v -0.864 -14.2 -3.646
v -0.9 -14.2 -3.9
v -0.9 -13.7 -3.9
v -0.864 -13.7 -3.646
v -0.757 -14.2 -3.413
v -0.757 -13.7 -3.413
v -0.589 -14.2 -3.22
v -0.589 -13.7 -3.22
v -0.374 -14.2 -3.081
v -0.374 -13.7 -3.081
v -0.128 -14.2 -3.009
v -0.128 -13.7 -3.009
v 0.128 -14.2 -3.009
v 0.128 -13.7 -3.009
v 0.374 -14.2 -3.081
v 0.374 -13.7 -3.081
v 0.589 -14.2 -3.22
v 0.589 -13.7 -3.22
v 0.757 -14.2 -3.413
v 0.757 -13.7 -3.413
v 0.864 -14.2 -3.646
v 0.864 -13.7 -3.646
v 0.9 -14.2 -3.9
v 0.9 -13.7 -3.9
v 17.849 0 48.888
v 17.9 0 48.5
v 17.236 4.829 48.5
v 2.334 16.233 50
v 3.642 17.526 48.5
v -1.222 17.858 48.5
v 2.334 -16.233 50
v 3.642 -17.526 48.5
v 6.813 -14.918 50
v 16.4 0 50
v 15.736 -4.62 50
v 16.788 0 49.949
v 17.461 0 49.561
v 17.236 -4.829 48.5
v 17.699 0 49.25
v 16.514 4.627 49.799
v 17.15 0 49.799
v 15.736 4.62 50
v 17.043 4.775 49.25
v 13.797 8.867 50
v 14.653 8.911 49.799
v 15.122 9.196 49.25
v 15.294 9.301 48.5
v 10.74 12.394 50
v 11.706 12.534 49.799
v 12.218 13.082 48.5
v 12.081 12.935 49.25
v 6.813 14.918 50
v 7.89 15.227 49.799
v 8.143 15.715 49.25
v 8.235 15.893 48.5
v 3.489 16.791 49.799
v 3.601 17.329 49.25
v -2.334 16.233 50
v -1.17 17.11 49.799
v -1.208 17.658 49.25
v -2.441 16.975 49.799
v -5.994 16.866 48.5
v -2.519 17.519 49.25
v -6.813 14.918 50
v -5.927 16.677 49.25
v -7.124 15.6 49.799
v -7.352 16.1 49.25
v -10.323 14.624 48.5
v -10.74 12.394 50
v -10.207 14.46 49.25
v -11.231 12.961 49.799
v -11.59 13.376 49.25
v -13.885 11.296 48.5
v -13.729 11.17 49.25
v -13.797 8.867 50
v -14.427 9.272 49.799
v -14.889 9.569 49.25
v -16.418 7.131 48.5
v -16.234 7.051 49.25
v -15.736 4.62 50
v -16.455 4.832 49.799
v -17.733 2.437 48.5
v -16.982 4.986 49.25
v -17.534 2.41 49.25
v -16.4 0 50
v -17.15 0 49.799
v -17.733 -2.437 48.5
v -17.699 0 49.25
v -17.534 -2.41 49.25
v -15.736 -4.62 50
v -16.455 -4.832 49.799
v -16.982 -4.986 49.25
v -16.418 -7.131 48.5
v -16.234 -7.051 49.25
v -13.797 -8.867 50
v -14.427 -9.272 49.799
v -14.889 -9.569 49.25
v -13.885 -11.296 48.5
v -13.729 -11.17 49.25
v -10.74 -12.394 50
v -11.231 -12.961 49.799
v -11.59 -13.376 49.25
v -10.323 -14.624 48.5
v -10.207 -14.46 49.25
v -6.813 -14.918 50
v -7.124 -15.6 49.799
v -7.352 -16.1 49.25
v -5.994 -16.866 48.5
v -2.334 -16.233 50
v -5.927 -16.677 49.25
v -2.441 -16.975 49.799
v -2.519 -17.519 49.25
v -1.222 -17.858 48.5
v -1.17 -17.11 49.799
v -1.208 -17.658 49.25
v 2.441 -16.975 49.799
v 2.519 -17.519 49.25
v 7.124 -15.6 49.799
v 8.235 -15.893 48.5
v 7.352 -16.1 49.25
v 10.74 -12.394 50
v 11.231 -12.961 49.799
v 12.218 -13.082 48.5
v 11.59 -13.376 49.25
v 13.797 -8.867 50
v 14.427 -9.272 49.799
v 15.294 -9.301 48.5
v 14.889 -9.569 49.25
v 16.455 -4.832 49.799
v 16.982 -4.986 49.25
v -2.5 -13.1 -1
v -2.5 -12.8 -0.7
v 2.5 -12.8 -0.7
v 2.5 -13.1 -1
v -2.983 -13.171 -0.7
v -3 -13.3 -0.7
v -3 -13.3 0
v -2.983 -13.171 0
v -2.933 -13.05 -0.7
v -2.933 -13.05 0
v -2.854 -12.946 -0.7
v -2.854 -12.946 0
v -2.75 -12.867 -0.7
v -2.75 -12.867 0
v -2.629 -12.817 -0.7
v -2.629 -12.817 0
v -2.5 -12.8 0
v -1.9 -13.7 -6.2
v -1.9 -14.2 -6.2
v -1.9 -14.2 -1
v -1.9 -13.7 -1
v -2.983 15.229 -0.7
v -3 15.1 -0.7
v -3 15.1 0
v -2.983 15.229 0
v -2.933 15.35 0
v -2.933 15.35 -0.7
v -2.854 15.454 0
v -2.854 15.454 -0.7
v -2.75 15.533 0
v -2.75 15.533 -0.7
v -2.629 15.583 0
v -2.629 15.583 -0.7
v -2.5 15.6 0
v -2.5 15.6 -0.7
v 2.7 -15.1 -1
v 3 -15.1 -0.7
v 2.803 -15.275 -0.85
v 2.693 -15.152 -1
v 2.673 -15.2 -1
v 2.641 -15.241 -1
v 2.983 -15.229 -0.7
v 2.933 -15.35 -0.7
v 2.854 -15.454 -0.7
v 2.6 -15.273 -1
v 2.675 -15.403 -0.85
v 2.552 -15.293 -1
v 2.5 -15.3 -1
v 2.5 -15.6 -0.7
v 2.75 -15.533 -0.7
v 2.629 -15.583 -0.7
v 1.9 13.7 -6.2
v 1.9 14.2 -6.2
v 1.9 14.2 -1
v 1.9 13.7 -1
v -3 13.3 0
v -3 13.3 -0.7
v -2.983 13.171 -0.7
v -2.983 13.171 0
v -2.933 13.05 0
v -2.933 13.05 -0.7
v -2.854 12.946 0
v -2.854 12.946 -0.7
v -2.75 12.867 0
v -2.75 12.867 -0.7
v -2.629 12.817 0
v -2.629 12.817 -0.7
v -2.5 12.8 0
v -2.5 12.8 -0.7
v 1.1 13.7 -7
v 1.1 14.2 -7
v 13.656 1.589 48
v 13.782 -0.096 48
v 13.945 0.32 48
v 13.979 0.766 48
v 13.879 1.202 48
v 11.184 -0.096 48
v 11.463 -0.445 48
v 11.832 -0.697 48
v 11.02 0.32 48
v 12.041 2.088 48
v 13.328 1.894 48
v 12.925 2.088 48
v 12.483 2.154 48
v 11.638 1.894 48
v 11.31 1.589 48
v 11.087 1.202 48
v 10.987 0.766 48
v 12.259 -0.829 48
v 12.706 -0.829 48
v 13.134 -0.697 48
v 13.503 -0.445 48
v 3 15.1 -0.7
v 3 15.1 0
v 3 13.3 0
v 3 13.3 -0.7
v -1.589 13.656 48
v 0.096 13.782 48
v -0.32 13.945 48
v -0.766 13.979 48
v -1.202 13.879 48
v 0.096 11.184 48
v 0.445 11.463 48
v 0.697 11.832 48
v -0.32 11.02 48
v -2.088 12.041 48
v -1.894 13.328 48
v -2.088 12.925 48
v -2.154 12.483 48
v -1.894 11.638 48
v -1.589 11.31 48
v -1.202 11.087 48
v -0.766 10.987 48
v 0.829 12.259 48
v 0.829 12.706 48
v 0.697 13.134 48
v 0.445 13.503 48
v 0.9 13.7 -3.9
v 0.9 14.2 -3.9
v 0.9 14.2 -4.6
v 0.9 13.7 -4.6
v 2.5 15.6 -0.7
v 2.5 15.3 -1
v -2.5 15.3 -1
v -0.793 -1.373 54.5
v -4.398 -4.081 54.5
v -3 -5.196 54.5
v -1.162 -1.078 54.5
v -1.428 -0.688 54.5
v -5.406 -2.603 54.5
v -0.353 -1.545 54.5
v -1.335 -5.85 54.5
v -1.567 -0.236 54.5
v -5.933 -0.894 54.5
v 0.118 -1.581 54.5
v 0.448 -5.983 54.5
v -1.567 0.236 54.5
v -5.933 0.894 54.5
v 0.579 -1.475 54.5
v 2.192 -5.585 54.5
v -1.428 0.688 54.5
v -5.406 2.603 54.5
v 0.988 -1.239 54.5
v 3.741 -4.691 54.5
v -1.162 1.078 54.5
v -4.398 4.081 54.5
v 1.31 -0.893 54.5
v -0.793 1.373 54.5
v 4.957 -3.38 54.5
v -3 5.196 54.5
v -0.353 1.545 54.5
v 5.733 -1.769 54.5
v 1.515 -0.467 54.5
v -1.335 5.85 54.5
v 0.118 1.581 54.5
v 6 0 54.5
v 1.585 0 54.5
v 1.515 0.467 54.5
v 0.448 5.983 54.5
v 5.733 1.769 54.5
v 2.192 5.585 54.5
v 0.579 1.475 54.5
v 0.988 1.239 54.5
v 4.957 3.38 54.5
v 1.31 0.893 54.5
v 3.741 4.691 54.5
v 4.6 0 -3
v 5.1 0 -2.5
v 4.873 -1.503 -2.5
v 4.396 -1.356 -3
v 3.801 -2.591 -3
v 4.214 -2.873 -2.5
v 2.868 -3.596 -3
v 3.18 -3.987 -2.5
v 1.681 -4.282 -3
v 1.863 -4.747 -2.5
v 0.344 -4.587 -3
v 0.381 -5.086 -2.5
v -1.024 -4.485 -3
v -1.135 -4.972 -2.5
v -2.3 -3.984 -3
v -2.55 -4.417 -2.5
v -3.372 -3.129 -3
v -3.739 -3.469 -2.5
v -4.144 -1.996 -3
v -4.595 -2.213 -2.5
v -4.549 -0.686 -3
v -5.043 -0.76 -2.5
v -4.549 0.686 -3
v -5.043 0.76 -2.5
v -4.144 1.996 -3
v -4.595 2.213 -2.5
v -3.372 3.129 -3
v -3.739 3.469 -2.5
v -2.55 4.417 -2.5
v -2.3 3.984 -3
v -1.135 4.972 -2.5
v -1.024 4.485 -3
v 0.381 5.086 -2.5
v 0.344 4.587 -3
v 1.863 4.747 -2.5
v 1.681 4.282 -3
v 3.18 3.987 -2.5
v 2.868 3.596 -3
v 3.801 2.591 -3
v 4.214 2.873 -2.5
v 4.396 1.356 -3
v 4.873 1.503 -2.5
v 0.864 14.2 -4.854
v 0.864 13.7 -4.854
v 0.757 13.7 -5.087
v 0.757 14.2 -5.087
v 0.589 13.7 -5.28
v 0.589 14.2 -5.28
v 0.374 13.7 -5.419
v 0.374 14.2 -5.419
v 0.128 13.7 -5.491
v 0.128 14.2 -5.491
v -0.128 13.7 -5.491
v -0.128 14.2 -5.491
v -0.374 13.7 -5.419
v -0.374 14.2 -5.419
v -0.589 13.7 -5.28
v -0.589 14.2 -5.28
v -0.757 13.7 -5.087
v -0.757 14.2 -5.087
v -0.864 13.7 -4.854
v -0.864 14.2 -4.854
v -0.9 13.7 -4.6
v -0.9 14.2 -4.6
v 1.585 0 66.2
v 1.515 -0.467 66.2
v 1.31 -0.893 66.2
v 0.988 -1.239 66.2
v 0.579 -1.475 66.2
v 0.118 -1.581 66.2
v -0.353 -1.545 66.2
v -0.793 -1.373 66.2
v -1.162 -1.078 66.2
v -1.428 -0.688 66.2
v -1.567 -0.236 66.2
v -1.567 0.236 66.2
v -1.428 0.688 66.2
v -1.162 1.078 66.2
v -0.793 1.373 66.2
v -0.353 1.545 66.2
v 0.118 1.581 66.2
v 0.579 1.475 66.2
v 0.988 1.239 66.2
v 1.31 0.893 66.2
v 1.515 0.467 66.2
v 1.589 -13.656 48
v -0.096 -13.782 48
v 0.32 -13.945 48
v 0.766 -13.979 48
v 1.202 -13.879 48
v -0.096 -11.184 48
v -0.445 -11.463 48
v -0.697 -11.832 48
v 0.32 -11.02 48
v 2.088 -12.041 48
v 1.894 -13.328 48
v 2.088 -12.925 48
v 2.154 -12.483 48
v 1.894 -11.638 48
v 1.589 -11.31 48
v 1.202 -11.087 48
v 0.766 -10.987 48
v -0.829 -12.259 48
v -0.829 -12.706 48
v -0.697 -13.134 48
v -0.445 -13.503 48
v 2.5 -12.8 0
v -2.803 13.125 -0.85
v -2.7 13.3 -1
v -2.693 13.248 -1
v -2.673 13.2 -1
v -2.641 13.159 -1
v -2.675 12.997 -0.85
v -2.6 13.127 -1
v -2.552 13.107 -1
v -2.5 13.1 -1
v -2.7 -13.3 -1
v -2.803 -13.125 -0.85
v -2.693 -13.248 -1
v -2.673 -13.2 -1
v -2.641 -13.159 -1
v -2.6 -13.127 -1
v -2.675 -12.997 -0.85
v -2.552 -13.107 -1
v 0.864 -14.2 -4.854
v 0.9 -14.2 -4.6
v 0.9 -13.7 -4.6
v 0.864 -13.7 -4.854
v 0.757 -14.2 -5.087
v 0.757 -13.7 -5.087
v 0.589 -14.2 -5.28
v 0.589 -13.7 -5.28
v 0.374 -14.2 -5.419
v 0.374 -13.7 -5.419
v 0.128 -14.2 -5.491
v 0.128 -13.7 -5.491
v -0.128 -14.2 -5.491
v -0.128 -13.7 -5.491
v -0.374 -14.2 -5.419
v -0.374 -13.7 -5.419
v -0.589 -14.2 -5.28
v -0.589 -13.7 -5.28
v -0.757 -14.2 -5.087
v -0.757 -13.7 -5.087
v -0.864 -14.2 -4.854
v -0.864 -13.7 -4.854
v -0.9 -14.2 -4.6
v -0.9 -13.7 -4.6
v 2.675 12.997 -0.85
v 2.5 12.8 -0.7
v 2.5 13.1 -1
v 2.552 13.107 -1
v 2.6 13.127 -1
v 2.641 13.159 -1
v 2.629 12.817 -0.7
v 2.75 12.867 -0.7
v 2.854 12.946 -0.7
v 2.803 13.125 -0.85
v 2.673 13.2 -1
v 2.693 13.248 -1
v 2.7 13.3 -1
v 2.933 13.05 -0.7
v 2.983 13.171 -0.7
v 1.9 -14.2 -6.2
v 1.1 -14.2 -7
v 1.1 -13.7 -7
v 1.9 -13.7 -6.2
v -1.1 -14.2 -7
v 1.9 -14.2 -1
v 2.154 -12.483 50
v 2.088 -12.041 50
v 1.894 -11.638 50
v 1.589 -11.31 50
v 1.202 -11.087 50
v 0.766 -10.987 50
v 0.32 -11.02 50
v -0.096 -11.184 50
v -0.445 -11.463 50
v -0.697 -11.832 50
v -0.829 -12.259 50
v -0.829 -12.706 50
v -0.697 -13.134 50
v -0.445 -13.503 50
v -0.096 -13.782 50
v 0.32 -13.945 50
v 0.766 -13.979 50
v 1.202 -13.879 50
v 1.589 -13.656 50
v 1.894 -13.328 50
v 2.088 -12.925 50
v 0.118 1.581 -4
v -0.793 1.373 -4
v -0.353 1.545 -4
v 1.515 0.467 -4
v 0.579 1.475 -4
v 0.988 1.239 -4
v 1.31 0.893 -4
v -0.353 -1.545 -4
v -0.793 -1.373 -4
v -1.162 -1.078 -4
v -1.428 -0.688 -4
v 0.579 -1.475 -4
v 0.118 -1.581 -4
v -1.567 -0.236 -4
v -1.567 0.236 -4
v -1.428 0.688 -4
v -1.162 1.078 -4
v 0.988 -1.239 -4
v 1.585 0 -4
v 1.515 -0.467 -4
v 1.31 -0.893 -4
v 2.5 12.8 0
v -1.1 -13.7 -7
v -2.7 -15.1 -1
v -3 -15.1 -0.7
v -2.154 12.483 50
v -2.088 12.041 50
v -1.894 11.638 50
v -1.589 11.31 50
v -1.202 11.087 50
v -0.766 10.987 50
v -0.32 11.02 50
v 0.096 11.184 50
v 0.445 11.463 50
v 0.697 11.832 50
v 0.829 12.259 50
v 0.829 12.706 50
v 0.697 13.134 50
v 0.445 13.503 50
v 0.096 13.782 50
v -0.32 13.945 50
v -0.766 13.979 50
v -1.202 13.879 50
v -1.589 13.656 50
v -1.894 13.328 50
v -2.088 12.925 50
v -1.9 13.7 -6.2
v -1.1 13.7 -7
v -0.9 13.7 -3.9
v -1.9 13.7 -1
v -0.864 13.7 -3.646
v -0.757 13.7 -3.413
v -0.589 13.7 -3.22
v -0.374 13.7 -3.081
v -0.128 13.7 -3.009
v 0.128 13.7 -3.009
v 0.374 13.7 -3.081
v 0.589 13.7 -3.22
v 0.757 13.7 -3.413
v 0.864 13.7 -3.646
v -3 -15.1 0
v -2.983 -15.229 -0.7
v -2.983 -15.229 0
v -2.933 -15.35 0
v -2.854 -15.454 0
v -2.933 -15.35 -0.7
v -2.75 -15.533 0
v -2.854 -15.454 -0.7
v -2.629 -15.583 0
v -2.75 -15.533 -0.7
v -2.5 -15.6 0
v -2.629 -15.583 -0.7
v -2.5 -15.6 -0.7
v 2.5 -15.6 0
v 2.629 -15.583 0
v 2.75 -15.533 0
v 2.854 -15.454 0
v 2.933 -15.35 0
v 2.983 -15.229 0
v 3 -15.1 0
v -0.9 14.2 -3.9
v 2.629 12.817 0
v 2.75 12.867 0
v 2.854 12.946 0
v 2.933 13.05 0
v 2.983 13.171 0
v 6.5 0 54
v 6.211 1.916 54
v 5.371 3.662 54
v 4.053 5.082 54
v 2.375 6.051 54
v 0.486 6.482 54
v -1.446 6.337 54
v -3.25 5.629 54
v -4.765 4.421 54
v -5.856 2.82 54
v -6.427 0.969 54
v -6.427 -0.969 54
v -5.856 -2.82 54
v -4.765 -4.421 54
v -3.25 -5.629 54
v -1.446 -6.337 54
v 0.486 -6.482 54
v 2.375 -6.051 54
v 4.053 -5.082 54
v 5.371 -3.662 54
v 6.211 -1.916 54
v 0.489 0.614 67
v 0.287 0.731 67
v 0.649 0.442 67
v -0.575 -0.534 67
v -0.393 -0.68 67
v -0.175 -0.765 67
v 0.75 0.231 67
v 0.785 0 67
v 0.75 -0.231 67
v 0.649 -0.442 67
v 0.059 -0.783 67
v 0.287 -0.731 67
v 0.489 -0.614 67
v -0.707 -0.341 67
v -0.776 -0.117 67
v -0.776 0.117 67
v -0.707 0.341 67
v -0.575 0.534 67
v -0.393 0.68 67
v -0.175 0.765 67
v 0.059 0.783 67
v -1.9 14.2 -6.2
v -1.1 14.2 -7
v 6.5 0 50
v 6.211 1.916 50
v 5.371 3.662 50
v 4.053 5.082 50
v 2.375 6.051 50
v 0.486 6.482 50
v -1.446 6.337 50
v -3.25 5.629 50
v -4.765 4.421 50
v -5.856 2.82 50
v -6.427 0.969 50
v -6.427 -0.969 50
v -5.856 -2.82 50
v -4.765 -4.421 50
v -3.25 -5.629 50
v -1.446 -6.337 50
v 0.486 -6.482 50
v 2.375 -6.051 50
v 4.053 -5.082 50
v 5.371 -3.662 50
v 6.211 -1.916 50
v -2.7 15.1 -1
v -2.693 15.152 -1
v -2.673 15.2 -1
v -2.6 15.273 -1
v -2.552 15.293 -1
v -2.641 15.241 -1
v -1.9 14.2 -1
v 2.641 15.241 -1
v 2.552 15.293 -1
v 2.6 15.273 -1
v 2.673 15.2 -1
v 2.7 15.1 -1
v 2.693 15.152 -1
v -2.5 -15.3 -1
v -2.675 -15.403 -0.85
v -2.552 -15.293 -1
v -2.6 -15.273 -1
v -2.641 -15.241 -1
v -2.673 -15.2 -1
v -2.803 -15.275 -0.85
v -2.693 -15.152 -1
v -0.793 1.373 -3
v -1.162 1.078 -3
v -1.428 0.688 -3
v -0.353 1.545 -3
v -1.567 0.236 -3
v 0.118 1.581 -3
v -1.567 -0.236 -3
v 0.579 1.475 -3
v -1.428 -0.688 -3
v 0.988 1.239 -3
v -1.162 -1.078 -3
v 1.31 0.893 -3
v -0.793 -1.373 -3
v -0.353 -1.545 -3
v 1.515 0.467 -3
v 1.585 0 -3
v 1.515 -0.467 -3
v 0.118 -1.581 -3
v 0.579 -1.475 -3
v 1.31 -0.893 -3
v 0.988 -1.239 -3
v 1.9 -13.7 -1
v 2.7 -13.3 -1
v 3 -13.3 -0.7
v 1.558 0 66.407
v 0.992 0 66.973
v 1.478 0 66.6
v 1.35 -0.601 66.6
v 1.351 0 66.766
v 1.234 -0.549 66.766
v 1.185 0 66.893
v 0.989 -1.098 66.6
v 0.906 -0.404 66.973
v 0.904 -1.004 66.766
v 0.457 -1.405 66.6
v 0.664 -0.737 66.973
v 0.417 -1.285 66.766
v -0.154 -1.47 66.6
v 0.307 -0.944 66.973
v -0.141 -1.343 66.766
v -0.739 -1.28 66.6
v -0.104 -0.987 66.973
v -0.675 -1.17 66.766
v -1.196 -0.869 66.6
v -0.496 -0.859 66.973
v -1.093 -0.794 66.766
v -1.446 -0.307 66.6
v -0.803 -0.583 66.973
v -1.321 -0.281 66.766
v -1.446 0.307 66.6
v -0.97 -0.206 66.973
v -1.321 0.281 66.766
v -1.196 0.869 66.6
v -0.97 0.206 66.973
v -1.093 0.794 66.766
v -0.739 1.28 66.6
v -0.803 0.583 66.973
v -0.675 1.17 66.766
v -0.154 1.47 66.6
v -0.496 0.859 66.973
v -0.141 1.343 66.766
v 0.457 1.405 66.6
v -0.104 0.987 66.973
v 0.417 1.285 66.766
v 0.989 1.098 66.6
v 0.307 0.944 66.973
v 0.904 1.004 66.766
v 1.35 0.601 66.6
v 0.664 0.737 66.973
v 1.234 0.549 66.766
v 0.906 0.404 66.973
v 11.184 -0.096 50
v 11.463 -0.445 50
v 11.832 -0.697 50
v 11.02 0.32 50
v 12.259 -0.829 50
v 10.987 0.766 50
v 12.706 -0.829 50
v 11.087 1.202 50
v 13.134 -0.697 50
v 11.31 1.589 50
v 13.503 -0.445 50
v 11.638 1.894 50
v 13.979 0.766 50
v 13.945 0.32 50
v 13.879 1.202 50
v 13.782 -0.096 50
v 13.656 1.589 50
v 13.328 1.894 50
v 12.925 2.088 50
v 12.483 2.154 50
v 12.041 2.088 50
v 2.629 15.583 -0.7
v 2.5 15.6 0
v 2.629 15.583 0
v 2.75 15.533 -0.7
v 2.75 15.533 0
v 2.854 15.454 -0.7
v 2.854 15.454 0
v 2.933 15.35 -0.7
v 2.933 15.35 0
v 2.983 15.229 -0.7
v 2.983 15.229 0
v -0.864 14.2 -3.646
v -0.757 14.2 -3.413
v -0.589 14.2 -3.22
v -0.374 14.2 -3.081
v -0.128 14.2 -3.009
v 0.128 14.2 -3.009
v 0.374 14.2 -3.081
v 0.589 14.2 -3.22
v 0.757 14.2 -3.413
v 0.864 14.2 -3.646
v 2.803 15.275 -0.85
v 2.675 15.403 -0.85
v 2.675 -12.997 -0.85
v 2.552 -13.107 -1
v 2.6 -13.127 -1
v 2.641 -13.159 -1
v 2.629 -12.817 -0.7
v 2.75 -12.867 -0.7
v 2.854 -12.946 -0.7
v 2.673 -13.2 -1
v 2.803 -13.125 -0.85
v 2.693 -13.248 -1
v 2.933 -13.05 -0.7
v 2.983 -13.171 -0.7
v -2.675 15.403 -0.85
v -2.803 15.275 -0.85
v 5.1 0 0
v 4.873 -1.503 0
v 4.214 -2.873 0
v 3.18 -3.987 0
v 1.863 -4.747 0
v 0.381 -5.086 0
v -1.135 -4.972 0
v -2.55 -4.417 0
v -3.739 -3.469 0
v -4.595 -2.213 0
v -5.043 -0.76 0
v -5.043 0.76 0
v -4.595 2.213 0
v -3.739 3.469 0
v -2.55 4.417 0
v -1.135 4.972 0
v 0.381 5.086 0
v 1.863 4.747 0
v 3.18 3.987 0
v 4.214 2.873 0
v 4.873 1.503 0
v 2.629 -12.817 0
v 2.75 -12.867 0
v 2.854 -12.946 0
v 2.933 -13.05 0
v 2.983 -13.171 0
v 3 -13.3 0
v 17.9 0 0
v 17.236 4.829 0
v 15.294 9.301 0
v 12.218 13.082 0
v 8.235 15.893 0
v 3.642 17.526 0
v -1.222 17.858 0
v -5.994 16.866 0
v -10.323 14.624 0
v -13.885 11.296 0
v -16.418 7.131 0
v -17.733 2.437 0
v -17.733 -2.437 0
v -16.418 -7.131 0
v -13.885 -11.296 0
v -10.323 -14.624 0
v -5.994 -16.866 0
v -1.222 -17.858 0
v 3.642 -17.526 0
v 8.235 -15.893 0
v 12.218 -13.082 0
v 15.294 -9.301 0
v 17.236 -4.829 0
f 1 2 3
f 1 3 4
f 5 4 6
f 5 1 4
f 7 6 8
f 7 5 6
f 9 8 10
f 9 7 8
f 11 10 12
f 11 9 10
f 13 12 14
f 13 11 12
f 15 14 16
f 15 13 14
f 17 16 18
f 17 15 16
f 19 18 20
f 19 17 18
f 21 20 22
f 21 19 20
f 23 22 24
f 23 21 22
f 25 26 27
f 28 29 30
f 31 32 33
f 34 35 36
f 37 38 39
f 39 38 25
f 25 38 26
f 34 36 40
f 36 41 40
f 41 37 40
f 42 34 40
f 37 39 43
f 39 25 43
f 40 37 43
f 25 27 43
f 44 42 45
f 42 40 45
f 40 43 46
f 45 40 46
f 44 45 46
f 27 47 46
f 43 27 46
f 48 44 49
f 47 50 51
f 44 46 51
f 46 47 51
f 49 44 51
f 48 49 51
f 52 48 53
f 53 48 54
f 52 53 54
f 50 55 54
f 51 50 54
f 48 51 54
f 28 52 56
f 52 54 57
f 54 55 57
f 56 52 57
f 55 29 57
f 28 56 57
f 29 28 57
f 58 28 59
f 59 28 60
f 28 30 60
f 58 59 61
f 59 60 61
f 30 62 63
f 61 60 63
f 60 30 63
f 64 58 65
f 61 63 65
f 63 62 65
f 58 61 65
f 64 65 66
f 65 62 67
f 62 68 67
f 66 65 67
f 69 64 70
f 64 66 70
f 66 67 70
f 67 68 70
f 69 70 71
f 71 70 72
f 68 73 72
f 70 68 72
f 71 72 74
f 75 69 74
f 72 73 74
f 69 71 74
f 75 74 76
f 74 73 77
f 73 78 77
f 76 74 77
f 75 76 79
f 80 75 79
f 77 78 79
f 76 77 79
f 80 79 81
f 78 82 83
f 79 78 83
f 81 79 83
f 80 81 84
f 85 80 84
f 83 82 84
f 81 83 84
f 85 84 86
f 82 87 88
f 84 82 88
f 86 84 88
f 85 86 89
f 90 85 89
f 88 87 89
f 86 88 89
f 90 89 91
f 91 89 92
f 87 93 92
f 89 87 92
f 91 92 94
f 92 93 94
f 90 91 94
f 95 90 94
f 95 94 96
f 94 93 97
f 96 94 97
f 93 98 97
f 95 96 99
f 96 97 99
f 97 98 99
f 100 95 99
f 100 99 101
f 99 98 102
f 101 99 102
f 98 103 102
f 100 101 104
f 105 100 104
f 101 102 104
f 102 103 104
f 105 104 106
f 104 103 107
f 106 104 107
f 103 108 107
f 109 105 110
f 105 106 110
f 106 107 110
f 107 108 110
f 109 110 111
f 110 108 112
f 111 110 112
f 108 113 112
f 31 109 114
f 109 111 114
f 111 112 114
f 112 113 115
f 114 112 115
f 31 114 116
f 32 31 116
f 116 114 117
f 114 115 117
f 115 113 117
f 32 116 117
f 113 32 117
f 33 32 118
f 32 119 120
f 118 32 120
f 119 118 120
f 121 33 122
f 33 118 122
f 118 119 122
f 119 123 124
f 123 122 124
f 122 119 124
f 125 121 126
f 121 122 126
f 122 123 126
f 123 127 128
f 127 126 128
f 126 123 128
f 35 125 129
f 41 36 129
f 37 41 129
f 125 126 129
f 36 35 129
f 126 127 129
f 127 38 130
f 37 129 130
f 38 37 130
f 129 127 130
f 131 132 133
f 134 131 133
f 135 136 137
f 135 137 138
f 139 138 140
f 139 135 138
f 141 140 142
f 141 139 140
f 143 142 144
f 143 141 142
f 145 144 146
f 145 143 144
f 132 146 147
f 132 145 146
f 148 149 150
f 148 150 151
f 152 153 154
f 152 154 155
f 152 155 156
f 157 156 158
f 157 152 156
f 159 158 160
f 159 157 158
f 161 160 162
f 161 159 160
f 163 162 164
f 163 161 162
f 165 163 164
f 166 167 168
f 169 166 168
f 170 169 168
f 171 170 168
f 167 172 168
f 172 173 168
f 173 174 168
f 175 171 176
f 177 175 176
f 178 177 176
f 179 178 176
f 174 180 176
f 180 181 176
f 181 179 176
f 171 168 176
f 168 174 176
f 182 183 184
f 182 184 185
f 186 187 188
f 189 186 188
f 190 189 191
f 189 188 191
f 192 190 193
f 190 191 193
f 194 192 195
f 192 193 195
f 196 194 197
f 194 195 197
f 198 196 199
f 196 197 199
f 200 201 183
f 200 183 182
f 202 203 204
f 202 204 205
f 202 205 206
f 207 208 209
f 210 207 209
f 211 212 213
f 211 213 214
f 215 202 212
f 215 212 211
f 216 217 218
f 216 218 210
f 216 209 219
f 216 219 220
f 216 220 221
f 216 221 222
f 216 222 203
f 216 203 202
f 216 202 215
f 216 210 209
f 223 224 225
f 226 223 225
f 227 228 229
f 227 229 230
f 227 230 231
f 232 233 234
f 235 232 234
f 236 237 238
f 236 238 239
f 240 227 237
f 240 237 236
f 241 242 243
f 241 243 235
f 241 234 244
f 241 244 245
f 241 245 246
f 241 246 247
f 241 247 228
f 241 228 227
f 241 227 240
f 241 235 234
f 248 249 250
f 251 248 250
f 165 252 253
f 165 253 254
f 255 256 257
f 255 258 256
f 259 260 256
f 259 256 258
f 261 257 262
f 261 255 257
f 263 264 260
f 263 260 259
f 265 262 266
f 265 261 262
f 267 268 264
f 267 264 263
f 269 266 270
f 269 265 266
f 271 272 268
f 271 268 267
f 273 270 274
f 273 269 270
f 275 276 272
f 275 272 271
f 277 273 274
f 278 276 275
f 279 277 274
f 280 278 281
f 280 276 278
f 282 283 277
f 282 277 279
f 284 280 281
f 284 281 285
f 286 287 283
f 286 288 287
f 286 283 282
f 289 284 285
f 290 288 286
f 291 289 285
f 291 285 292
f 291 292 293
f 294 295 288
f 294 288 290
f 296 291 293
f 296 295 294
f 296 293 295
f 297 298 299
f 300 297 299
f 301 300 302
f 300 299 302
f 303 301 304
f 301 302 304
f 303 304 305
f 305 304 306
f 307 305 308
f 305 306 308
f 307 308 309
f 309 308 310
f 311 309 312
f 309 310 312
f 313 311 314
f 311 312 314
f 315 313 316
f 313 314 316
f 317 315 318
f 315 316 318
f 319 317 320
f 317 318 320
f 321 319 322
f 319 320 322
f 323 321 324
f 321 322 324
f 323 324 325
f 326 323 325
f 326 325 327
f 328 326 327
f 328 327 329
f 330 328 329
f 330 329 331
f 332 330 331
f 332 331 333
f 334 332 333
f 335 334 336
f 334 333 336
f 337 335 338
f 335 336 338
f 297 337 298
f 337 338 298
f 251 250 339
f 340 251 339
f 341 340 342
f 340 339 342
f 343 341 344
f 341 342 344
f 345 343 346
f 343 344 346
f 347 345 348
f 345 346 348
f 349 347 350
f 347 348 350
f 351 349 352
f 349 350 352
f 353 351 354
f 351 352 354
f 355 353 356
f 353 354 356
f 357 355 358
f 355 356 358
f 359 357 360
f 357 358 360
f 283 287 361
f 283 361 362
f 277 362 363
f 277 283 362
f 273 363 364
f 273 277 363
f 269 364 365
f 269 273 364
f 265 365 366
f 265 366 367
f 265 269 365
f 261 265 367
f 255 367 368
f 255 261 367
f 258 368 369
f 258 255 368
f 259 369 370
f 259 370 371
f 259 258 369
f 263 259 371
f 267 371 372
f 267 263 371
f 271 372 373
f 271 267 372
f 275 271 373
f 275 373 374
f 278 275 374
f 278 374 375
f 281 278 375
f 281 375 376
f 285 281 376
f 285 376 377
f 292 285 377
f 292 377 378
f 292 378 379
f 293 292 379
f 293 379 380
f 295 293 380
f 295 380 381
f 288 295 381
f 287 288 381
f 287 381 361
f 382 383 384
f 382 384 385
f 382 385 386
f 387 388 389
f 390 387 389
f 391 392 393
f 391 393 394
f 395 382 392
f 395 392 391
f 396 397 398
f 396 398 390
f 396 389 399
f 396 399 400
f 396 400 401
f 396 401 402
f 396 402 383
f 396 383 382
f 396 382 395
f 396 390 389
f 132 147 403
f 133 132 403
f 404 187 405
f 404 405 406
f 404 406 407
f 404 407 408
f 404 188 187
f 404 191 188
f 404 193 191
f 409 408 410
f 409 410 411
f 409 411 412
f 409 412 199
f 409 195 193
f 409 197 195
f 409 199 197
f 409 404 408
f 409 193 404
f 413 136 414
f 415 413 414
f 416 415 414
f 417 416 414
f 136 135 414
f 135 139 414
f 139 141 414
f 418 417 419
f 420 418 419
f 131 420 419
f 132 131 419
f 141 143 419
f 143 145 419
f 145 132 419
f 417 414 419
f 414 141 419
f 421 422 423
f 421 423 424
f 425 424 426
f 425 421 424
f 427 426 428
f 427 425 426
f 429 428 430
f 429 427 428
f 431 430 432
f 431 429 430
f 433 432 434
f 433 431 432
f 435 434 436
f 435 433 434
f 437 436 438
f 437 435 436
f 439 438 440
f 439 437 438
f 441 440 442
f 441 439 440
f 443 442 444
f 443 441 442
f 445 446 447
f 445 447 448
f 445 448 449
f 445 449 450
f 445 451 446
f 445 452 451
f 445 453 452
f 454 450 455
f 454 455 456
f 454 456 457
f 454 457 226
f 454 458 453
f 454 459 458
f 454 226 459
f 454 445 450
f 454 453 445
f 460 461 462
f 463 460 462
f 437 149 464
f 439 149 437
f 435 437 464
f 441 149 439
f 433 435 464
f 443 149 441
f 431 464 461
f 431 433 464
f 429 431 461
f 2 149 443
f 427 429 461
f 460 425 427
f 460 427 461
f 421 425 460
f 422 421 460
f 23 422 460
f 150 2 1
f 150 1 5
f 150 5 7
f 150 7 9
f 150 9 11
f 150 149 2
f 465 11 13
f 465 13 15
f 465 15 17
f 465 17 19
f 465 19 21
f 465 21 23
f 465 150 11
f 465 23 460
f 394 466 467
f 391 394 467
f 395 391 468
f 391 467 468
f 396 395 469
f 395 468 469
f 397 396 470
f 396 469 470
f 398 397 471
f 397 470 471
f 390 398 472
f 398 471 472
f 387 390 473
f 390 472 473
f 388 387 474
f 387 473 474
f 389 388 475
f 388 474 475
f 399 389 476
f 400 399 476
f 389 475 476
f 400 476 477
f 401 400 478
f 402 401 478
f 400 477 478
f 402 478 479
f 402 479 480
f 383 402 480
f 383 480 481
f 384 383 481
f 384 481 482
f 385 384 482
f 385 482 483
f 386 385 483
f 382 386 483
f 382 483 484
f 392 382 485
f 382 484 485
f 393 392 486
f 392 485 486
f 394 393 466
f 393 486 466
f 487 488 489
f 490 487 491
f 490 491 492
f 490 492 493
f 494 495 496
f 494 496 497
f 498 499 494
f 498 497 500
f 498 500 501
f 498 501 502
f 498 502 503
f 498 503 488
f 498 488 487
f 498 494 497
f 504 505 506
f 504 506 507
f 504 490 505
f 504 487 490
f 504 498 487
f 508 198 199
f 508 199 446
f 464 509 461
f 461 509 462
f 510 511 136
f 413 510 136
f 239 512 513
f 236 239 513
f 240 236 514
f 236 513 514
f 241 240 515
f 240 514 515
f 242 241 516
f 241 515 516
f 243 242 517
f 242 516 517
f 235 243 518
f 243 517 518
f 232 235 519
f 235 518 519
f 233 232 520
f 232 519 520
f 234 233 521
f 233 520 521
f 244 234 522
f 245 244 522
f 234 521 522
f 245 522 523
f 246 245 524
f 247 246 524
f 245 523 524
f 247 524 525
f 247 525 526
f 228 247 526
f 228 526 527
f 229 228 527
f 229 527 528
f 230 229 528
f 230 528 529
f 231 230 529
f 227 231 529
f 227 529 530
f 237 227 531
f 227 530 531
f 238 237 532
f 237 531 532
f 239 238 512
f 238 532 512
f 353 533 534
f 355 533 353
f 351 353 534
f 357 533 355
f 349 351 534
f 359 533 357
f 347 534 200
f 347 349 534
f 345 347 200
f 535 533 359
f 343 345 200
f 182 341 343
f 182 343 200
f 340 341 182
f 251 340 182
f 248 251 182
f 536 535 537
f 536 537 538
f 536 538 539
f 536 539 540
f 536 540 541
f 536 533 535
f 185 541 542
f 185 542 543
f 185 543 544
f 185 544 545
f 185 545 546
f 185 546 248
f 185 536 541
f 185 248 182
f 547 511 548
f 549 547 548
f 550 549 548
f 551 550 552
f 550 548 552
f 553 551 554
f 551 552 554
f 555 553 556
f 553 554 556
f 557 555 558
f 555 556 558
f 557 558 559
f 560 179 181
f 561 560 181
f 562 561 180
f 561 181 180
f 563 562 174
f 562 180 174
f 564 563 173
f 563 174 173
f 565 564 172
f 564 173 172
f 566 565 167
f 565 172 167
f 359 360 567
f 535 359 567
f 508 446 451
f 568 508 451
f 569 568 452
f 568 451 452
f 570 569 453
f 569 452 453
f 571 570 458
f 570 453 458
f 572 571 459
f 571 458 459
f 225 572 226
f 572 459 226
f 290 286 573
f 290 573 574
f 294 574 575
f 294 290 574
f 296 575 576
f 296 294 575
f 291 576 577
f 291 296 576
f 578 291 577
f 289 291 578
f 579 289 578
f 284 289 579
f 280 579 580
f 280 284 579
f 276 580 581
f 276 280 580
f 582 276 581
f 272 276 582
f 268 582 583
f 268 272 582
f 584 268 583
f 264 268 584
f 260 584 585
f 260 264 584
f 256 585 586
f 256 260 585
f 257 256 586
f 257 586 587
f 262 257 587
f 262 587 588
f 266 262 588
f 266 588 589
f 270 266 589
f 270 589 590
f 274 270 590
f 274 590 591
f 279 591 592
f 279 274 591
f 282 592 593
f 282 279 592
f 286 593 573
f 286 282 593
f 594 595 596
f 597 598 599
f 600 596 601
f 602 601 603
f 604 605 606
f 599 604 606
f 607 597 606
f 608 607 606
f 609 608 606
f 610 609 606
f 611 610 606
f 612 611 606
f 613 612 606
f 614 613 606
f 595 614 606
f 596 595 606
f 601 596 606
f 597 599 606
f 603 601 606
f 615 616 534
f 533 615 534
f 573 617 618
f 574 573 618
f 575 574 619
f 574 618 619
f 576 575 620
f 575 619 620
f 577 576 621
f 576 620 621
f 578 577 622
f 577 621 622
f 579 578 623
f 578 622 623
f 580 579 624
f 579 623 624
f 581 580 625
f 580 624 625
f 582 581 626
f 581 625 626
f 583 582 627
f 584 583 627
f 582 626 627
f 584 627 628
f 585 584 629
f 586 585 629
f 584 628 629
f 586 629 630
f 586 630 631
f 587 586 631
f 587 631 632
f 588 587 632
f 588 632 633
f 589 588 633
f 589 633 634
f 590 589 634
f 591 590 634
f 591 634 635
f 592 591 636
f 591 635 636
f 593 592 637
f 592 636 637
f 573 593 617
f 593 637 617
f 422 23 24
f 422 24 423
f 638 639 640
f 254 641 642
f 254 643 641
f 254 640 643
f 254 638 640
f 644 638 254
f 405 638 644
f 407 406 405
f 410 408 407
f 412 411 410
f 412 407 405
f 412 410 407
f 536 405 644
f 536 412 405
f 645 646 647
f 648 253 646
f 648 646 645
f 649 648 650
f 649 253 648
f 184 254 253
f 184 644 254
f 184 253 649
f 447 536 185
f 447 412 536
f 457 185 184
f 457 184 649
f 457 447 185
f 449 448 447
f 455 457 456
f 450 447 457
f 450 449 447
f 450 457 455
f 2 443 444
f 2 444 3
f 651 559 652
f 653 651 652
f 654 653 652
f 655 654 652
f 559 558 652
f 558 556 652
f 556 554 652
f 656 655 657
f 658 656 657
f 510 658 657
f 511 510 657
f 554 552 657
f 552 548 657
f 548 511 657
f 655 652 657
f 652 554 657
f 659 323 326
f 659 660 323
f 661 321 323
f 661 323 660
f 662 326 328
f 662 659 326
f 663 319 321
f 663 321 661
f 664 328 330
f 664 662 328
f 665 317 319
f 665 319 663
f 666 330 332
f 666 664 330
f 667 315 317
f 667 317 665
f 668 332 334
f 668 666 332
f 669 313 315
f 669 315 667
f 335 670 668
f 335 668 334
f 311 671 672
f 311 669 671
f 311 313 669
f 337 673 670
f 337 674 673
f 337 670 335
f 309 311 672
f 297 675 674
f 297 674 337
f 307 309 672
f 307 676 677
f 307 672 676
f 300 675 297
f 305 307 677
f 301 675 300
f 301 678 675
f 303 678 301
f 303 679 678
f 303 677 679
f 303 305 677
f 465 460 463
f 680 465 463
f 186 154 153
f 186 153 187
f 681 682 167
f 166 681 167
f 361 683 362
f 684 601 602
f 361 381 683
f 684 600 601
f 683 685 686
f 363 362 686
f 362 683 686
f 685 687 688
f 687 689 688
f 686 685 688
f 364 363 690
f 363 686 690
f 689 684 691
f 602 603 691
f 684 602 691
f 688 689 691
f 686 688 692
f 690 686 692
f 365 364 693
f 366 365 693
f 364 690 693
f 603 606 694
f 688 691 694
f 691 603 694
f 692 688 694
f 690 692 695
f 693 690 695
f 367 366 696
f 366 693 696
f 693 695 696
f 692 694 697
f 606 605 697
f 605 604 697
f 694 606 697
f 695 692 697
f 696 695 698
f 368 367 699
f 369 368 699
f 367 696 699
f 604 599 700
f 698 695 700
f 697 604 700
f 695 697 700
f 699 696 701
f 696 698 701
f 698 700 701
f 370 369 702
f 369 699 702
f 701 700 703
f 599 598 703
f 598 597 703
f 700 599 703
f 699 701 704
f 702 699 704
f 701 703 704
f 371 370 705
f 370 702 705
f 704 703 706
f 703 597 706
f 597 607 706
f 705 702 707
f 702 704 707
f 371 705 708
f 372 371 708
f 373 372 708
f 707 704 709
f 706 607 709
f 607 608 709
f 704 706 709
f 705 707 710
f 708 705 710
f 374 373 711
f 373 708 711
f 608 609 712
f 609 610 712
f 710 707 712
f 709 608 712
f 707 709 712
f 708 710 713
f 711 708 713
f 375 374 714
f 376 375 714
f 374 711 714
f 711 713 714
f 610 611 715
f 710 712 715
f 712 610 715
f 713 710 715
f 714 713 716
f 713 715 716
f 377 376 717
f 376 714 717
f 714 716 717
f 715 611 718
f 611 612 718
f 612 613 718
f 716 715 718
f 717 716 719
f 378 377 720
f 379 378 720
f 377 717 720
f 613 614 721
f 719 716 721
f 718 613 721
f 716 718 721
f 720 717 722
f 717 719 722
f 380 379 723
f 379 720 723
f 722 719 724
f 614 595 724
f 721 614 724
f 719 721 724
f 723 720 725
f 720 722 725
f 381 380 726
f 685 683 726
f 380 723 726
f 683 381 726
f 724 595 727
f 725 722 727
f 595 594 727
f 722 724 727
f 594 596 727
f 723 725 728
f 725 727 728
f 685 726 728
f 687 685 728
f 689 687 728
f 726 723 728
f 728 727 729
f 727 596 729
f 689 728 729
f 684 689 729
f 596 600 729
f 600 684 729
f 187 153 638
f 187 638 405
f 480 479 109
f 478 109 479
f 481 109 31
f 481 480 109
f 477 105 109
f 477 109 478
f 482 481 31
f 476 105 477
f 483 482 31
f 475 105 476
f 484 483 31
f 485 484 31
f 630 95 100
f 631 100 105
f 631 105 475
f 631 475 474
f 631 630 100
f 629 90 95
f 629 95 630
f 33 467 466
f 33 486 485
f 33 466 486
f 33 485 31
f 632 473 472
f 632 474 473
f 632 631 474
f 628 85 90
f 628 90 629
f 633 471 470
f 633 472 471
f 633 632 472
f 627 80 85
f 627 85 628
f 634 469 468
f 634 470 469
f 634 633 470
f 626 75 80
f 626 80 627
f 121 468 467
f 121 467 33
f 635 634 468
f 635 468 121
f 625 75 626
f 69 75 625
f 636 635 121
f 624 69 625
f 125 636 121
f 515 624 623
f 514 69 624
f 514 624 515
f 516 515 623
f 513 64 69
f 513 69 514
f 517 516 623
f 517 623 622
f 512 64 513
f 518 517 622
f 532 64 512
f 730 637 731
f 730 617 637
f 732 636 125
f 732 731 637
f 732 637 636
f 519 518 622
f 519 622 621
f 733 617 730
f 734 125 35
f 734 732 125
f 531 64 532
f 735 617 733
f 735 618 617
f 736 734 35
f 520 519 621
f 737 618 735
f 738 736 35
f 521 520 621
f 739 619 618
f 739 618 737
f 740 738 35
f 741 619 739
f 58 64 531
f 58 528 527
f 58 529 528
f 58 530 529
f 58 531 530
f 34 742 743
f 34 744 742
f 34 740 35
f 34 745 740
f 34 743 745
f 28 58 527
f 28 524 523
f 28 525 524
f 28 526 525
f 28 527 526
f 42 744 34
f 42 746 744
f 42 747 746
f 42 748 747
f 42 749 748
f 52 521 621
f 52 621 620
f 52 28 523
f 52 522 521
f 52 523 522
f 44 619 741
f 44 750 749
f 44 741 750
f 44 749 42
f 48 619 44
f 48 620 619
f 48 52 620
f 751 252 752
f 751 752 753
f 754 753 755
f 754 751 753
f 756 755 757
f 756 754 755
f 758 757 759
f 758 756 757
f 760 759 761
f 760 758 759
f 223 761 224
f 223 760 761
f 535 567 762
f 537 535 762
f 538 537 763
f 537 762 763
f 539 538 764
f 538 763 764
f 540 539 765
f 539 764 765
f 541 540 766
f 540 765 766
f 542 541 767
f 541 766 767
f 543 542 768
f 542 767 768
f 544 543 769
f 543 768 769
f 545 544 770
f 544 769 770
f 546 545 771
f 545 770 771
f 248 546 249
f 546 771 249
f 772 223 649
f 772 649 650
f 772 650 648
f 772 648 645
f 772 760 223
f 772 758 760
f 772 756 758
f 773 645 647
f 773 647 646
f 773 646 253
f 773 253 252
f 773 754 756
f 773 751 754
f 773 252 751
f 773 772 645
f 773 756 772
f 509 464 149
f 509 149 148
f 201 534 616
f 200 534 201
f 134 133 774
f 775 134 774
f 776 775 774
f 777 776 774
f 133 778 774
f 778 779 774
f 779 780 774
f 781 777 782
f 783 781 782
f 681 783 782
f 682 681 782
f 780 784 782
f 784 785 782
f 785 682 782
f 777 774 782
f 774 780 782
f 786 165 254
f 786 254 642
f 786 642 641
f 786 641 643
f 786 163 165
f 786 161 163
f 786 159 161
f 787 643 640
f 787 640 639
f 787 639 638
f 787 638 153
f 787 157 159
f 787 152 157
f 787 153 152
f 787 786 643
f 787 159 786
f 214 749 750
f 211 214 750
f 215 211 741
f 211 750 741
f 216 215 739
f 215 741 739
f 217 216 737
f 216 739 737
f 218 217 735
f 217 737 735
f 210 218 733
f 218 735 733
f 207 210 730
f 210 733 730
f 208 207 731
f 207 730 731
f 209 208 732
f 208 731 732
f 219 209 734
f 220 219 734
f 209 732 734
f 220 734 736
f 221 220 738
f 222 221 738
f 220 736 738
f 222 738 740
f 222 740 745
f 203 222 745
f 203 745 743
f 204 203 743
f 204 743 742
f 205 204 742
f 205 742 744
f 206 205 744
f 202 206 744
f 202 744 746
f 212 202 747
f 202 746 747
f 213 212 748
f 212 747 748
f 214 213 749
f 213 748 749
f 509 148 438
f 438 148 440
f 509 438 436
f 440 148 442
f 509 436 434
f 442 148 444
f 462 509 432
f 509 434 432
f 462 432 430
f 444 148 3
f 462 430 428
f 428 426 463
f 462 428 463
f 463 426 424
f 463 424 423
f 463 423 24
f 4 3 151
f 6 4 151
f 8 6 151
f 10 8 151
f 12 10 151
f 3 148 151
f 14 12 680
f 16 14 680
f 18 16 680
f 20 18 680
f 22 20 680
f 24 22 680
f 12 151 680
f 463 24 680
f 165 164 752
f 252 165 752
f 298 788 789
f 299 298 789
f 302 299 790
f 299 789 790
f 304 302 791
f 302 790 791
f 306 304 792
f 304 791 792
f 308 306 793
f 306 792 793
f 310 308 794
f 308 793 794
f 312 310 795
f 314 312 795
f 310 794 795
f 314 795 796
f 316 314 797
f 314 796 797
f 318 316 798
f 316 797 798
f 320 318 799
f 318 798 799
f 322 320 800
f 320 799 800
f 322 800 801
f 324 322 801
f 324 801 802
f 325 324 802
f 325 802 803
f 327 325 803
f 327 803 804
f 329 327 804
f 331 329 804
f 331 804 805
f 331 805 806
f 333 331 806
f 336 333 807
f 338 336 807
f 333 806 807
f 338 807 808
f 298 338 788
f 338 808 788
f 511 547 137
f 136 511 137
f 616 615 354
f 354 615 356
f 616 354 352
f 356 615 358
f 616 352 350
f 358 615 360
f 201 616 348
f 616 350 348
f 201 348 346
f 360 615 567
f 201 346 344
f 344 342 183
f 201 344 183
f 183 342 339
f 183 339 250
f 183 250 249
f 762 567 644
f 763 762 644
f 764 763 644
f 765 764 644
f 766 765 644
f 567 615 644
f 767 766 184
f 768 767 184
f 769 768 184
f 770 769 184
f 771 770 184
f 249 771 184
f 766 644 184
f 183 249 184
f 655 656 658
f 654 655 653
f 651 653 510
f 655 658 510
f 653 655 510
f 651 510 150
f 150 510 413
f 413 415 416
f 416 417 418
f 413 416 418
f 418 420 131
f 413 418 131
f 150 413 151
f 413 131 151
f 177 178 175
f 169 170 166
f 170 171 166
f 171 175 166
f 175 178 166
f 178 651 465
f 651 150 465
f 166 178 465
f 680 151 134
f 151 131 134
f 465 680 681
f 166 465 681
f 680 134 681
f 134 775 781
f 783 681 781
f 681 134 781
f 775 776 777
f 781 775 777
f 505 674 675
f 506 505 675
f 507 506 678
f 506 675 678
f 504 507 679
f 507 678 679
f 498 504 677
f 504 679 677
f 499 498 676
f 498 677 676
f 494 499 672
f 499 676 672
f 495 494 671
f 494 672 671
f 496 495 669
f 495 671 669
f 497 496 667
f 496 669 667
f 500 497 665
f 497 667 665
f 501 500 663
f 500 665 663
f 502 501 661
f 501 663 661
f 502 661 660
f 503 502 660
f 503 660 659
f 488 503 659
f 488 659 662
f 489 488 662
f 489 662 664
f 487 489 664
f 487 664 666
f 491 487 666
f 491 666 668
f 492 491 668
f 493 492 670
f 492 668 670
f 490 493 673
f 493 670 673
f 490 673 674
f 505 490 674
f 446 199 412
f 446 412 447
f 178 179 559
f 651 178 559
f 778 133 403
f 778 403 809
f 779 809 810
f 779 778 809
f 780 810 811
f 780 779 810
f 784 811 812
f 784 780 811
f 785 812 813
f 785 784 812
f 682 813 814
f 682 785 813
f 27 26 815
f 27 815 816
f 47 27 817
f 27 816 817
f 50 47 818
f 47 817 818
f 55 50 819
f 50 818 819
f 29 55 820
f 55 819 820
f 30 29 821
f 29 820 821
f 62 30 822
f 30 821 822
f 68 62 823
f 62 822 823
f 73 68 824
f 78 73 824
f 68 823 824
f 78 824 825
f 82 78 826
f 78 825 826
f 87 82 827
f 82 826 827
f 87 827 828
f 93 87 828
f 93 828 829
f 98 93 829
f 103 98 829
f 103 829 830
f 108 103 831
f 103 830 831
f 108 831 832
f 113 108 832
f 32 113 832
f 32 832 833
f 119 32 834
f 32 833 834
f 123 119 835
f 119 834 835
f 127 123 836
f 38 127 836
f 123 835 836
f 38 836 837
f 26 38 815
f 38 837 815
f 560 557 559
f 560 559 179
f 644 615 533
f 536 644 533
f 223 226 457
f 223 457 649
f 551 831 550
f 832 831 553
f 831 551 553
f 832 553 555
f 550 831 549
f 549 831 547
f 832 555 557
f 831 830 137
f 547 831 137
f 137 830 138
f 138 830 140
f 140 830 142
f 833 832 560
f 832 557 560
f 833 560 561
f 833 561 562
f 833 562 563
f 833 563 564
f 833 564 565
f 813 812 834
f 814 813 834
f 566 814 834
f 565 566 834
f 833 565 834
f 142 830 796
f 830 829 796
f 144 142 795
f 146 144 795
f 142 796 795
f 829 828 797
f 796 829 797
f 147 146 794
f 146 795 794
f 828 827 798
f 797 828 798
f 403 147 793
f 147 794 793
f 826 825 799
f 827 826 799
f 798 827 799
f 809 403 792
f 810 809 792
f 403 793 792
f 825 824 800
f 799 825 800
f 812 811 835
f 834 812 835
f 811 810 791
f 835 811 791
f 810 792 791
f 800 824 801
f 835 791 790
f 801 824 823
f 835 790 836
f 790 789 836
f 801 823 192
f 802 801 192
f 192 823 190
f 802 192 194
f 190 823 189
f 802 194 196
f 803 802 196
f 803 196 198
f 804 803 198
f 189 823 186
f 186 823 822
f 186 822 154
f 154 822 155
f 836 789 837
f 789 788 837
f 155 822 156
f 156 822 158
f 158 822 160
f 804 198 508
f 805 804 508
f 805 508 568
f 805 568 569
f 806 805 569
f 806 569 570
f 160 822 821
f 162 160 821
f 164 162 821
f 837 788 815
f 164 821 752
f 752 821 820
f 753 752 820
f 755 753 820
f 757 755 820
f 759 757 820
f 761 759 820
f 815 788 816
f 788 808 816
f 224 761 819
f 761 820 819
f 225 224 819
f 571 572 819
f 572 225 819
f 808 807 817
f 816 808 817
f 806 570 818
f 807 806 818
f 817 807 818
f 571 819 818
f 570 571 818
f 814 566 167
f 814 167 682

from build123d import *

# Parameters (mm, degrees)
F0_R      = 17.9
F1_DEPTH  = 50
F2_R      = 5.1
F3_DEPTH  = 3
F4_R      = 1.585
F5_DEPTH  = 1
F6_R      = 6.5
F7_DEPTH  = 4.5
F8_DEPTH  = 71
F9_W      = 6
F9_H      = 2.8
F10_DEPTH = 1
F11_W     = 3.8
F11_H     = 0.5
F12_DEPTH = 6
F13_SIZE  = 0.8
F14_R     = 0.5
F15_SIZE  = 0.3
F17_DEPTH = 1
F19_SIZE  = 0.5
F20_SIZE  = 0.5
F21_R     = 1.5
F22_R     = 0.8
F23_R     = 1.5
F24_DEPTH = 2
F25_COUNT = 3
F25_ANGLE = 180


with BuildPart() as f1:
    # F0 (on Top) → F1 (new body)
    with BuildSketch(Plane.XY):
        Circle(F0_R)
    extrude(amount=F1_DEPTH)

    # F2 (on face) → F3 (join)
    with BuildSketch(Plane(origin=(0, 0, 0), x_dir=(1, 0, 0), z_dir=(0, 0, -1))):
        Circle(F2_R)
    extrude(amount=F3_DEPTH)

    # F4 (on face) → F5 (join)
    with BuildSketch(Plane(origin=(0, 0, -3), x_dir=(1, 0, 0), z_dir=(0, 0, -1))):
        Circle(F4_R)
    extrude(amount=F5_DEPTH)

    # F6 (on face) → F7 (join)
    with BuildSketch(Plane.XY.offset(50)):
        Circle(F6_R)
    extrude(amount=F7_DEPTH)

    # F8 (add): a face of the model
    f8_faces = [f1.faces().sort_by_distance(p)[0] for p in [
        (0, 0, -4),
    ]]
    extrude(f8_faces, amount=-F8_DEPTH)



with BuildPart() as f10:
    # F9 (on face) → F10 (new body)
    with BuildSketch(Plane(origin=(0, 0, 0), x_dir=(1, 0, 0), z_dir=(0, 0, -1))):
        with Locations((0, -14.2)):
            Rectangle(F9_W, F9_H)
    extrude(amount=F10_DEPTH)

    # F11 (on face) → F12 (join)
    with BuildSketch(Plane(origin=(0, 0, -1), x_dir=(1, 0, 0), z_dir=(0, 0, -1))):
        with Locations((0, -13.95)):
            Rectangle(F11_W, F11_H)
    extrude(amount=F12_DEPTH)

    # F13
    f13_edges = [f10.edges().sort_by_distance(p)[0] for p in [
        (1.9, 13.95, -7),
        (-1.9, 13.95, -7),
    ]]
    chamfer(f13_edges, length=F13_SIZE)

    # F14
    f14_edges = [f10.edges().sort_by_distance(p)[0] for p in [
        (3, 15.6, -0.5),
        (-3, 15.6, -0.5),
        (3, 12.8, -0.5),
        (-3, 12.8, -0.5),
    ]]
    fillet(f14_edges, radius=F14_R)

    # F15
    f15_edges = [f10.edges().sort_by_distance(p)[0] for p in [
        (0, 12.8, -1),
    ]]
    chamfer(f15_edges, length=F15_SIZE)

    # F16 (on face) → F17 (cut)
    with BuildSketch(Plane(origin=(0, 14.2, 0), x_dir=(-1, 0, 0), z_dir=(0, 1, 0))):
        with BuildLine():
            Line((0.9, -4.6), (0.9, -3.9))
            ThreePointArc((0.9, -3.9), (0, -3), (-0.9, -3.9))
            Line((-0.9, -3.9), (-0.9, -4.6))
            ThreePointArc((-0.9, -4.6), (0, -5.5), (0.9, -4.6))
        make_face()
    extrude(amount=-F17_DEPTH, mode=Mode.SUBTRACT)


with BuildPart() as f1_1:
    add(f1.part)

    add(f10.part)  # F18 merges F10
    # F18: F10 across plane
    add(f10.part.mirror(Plane.XZ))

    # F19
    f19_edges = [f1_1.edges().sort_by_distance(p)[0] for p in [
        (-5.1, 0, -3),
    ]]
    chamfer(f19_edges, length=F19_SIZE)

    # F20
    f20_edges = [f1_1.edges().sort_by_distance(p)[0] for p in [
        (-6.5, 0, 54.5),
    ]]
    chamfer(f20_edges, length=F20_SIZE)

    # F21
    f21_edges = [f1_1.edges().sort_by_distance(p)[0] for p in [
        (-17.9, 0, 50),
    ]]
    fillet(f21_edges, radius=F21_R)

    # F22
    f22_edges = [f1_1.edges().sort_by_distance(p)[0] for p in [
        (-1.585, 0, 67),
    ]]
    fillet(f22_edges, radius=F22_R)

    # F25: F24 ×3 about axis
    f25_axis = Axis((0, 0, 0), (0, 0, 1))


with BuildPart() as f24:
    # F23 (on face) → F24 (new body)
    with BuildSketch(Plane.XY.offset(50)):
        with Locations((0.654199453, -12.4828691844)):
            Circle(F23_R)
    extrude(amount=-F24_DEPTH)


with BuildPart() as f1_2:
    add(f1_1.part)
    for i in range(1, F25_COUNT):
        add(f24.part.rotate(f25_axis, i * F25_ANGLE / (F25_COUNT - 1)), mode=Mode.SUBTRACT)

    # F25#seed: cut F24
    add(f24.part, mode=Mode.SUBTRACT)


solid = f1_2.part
